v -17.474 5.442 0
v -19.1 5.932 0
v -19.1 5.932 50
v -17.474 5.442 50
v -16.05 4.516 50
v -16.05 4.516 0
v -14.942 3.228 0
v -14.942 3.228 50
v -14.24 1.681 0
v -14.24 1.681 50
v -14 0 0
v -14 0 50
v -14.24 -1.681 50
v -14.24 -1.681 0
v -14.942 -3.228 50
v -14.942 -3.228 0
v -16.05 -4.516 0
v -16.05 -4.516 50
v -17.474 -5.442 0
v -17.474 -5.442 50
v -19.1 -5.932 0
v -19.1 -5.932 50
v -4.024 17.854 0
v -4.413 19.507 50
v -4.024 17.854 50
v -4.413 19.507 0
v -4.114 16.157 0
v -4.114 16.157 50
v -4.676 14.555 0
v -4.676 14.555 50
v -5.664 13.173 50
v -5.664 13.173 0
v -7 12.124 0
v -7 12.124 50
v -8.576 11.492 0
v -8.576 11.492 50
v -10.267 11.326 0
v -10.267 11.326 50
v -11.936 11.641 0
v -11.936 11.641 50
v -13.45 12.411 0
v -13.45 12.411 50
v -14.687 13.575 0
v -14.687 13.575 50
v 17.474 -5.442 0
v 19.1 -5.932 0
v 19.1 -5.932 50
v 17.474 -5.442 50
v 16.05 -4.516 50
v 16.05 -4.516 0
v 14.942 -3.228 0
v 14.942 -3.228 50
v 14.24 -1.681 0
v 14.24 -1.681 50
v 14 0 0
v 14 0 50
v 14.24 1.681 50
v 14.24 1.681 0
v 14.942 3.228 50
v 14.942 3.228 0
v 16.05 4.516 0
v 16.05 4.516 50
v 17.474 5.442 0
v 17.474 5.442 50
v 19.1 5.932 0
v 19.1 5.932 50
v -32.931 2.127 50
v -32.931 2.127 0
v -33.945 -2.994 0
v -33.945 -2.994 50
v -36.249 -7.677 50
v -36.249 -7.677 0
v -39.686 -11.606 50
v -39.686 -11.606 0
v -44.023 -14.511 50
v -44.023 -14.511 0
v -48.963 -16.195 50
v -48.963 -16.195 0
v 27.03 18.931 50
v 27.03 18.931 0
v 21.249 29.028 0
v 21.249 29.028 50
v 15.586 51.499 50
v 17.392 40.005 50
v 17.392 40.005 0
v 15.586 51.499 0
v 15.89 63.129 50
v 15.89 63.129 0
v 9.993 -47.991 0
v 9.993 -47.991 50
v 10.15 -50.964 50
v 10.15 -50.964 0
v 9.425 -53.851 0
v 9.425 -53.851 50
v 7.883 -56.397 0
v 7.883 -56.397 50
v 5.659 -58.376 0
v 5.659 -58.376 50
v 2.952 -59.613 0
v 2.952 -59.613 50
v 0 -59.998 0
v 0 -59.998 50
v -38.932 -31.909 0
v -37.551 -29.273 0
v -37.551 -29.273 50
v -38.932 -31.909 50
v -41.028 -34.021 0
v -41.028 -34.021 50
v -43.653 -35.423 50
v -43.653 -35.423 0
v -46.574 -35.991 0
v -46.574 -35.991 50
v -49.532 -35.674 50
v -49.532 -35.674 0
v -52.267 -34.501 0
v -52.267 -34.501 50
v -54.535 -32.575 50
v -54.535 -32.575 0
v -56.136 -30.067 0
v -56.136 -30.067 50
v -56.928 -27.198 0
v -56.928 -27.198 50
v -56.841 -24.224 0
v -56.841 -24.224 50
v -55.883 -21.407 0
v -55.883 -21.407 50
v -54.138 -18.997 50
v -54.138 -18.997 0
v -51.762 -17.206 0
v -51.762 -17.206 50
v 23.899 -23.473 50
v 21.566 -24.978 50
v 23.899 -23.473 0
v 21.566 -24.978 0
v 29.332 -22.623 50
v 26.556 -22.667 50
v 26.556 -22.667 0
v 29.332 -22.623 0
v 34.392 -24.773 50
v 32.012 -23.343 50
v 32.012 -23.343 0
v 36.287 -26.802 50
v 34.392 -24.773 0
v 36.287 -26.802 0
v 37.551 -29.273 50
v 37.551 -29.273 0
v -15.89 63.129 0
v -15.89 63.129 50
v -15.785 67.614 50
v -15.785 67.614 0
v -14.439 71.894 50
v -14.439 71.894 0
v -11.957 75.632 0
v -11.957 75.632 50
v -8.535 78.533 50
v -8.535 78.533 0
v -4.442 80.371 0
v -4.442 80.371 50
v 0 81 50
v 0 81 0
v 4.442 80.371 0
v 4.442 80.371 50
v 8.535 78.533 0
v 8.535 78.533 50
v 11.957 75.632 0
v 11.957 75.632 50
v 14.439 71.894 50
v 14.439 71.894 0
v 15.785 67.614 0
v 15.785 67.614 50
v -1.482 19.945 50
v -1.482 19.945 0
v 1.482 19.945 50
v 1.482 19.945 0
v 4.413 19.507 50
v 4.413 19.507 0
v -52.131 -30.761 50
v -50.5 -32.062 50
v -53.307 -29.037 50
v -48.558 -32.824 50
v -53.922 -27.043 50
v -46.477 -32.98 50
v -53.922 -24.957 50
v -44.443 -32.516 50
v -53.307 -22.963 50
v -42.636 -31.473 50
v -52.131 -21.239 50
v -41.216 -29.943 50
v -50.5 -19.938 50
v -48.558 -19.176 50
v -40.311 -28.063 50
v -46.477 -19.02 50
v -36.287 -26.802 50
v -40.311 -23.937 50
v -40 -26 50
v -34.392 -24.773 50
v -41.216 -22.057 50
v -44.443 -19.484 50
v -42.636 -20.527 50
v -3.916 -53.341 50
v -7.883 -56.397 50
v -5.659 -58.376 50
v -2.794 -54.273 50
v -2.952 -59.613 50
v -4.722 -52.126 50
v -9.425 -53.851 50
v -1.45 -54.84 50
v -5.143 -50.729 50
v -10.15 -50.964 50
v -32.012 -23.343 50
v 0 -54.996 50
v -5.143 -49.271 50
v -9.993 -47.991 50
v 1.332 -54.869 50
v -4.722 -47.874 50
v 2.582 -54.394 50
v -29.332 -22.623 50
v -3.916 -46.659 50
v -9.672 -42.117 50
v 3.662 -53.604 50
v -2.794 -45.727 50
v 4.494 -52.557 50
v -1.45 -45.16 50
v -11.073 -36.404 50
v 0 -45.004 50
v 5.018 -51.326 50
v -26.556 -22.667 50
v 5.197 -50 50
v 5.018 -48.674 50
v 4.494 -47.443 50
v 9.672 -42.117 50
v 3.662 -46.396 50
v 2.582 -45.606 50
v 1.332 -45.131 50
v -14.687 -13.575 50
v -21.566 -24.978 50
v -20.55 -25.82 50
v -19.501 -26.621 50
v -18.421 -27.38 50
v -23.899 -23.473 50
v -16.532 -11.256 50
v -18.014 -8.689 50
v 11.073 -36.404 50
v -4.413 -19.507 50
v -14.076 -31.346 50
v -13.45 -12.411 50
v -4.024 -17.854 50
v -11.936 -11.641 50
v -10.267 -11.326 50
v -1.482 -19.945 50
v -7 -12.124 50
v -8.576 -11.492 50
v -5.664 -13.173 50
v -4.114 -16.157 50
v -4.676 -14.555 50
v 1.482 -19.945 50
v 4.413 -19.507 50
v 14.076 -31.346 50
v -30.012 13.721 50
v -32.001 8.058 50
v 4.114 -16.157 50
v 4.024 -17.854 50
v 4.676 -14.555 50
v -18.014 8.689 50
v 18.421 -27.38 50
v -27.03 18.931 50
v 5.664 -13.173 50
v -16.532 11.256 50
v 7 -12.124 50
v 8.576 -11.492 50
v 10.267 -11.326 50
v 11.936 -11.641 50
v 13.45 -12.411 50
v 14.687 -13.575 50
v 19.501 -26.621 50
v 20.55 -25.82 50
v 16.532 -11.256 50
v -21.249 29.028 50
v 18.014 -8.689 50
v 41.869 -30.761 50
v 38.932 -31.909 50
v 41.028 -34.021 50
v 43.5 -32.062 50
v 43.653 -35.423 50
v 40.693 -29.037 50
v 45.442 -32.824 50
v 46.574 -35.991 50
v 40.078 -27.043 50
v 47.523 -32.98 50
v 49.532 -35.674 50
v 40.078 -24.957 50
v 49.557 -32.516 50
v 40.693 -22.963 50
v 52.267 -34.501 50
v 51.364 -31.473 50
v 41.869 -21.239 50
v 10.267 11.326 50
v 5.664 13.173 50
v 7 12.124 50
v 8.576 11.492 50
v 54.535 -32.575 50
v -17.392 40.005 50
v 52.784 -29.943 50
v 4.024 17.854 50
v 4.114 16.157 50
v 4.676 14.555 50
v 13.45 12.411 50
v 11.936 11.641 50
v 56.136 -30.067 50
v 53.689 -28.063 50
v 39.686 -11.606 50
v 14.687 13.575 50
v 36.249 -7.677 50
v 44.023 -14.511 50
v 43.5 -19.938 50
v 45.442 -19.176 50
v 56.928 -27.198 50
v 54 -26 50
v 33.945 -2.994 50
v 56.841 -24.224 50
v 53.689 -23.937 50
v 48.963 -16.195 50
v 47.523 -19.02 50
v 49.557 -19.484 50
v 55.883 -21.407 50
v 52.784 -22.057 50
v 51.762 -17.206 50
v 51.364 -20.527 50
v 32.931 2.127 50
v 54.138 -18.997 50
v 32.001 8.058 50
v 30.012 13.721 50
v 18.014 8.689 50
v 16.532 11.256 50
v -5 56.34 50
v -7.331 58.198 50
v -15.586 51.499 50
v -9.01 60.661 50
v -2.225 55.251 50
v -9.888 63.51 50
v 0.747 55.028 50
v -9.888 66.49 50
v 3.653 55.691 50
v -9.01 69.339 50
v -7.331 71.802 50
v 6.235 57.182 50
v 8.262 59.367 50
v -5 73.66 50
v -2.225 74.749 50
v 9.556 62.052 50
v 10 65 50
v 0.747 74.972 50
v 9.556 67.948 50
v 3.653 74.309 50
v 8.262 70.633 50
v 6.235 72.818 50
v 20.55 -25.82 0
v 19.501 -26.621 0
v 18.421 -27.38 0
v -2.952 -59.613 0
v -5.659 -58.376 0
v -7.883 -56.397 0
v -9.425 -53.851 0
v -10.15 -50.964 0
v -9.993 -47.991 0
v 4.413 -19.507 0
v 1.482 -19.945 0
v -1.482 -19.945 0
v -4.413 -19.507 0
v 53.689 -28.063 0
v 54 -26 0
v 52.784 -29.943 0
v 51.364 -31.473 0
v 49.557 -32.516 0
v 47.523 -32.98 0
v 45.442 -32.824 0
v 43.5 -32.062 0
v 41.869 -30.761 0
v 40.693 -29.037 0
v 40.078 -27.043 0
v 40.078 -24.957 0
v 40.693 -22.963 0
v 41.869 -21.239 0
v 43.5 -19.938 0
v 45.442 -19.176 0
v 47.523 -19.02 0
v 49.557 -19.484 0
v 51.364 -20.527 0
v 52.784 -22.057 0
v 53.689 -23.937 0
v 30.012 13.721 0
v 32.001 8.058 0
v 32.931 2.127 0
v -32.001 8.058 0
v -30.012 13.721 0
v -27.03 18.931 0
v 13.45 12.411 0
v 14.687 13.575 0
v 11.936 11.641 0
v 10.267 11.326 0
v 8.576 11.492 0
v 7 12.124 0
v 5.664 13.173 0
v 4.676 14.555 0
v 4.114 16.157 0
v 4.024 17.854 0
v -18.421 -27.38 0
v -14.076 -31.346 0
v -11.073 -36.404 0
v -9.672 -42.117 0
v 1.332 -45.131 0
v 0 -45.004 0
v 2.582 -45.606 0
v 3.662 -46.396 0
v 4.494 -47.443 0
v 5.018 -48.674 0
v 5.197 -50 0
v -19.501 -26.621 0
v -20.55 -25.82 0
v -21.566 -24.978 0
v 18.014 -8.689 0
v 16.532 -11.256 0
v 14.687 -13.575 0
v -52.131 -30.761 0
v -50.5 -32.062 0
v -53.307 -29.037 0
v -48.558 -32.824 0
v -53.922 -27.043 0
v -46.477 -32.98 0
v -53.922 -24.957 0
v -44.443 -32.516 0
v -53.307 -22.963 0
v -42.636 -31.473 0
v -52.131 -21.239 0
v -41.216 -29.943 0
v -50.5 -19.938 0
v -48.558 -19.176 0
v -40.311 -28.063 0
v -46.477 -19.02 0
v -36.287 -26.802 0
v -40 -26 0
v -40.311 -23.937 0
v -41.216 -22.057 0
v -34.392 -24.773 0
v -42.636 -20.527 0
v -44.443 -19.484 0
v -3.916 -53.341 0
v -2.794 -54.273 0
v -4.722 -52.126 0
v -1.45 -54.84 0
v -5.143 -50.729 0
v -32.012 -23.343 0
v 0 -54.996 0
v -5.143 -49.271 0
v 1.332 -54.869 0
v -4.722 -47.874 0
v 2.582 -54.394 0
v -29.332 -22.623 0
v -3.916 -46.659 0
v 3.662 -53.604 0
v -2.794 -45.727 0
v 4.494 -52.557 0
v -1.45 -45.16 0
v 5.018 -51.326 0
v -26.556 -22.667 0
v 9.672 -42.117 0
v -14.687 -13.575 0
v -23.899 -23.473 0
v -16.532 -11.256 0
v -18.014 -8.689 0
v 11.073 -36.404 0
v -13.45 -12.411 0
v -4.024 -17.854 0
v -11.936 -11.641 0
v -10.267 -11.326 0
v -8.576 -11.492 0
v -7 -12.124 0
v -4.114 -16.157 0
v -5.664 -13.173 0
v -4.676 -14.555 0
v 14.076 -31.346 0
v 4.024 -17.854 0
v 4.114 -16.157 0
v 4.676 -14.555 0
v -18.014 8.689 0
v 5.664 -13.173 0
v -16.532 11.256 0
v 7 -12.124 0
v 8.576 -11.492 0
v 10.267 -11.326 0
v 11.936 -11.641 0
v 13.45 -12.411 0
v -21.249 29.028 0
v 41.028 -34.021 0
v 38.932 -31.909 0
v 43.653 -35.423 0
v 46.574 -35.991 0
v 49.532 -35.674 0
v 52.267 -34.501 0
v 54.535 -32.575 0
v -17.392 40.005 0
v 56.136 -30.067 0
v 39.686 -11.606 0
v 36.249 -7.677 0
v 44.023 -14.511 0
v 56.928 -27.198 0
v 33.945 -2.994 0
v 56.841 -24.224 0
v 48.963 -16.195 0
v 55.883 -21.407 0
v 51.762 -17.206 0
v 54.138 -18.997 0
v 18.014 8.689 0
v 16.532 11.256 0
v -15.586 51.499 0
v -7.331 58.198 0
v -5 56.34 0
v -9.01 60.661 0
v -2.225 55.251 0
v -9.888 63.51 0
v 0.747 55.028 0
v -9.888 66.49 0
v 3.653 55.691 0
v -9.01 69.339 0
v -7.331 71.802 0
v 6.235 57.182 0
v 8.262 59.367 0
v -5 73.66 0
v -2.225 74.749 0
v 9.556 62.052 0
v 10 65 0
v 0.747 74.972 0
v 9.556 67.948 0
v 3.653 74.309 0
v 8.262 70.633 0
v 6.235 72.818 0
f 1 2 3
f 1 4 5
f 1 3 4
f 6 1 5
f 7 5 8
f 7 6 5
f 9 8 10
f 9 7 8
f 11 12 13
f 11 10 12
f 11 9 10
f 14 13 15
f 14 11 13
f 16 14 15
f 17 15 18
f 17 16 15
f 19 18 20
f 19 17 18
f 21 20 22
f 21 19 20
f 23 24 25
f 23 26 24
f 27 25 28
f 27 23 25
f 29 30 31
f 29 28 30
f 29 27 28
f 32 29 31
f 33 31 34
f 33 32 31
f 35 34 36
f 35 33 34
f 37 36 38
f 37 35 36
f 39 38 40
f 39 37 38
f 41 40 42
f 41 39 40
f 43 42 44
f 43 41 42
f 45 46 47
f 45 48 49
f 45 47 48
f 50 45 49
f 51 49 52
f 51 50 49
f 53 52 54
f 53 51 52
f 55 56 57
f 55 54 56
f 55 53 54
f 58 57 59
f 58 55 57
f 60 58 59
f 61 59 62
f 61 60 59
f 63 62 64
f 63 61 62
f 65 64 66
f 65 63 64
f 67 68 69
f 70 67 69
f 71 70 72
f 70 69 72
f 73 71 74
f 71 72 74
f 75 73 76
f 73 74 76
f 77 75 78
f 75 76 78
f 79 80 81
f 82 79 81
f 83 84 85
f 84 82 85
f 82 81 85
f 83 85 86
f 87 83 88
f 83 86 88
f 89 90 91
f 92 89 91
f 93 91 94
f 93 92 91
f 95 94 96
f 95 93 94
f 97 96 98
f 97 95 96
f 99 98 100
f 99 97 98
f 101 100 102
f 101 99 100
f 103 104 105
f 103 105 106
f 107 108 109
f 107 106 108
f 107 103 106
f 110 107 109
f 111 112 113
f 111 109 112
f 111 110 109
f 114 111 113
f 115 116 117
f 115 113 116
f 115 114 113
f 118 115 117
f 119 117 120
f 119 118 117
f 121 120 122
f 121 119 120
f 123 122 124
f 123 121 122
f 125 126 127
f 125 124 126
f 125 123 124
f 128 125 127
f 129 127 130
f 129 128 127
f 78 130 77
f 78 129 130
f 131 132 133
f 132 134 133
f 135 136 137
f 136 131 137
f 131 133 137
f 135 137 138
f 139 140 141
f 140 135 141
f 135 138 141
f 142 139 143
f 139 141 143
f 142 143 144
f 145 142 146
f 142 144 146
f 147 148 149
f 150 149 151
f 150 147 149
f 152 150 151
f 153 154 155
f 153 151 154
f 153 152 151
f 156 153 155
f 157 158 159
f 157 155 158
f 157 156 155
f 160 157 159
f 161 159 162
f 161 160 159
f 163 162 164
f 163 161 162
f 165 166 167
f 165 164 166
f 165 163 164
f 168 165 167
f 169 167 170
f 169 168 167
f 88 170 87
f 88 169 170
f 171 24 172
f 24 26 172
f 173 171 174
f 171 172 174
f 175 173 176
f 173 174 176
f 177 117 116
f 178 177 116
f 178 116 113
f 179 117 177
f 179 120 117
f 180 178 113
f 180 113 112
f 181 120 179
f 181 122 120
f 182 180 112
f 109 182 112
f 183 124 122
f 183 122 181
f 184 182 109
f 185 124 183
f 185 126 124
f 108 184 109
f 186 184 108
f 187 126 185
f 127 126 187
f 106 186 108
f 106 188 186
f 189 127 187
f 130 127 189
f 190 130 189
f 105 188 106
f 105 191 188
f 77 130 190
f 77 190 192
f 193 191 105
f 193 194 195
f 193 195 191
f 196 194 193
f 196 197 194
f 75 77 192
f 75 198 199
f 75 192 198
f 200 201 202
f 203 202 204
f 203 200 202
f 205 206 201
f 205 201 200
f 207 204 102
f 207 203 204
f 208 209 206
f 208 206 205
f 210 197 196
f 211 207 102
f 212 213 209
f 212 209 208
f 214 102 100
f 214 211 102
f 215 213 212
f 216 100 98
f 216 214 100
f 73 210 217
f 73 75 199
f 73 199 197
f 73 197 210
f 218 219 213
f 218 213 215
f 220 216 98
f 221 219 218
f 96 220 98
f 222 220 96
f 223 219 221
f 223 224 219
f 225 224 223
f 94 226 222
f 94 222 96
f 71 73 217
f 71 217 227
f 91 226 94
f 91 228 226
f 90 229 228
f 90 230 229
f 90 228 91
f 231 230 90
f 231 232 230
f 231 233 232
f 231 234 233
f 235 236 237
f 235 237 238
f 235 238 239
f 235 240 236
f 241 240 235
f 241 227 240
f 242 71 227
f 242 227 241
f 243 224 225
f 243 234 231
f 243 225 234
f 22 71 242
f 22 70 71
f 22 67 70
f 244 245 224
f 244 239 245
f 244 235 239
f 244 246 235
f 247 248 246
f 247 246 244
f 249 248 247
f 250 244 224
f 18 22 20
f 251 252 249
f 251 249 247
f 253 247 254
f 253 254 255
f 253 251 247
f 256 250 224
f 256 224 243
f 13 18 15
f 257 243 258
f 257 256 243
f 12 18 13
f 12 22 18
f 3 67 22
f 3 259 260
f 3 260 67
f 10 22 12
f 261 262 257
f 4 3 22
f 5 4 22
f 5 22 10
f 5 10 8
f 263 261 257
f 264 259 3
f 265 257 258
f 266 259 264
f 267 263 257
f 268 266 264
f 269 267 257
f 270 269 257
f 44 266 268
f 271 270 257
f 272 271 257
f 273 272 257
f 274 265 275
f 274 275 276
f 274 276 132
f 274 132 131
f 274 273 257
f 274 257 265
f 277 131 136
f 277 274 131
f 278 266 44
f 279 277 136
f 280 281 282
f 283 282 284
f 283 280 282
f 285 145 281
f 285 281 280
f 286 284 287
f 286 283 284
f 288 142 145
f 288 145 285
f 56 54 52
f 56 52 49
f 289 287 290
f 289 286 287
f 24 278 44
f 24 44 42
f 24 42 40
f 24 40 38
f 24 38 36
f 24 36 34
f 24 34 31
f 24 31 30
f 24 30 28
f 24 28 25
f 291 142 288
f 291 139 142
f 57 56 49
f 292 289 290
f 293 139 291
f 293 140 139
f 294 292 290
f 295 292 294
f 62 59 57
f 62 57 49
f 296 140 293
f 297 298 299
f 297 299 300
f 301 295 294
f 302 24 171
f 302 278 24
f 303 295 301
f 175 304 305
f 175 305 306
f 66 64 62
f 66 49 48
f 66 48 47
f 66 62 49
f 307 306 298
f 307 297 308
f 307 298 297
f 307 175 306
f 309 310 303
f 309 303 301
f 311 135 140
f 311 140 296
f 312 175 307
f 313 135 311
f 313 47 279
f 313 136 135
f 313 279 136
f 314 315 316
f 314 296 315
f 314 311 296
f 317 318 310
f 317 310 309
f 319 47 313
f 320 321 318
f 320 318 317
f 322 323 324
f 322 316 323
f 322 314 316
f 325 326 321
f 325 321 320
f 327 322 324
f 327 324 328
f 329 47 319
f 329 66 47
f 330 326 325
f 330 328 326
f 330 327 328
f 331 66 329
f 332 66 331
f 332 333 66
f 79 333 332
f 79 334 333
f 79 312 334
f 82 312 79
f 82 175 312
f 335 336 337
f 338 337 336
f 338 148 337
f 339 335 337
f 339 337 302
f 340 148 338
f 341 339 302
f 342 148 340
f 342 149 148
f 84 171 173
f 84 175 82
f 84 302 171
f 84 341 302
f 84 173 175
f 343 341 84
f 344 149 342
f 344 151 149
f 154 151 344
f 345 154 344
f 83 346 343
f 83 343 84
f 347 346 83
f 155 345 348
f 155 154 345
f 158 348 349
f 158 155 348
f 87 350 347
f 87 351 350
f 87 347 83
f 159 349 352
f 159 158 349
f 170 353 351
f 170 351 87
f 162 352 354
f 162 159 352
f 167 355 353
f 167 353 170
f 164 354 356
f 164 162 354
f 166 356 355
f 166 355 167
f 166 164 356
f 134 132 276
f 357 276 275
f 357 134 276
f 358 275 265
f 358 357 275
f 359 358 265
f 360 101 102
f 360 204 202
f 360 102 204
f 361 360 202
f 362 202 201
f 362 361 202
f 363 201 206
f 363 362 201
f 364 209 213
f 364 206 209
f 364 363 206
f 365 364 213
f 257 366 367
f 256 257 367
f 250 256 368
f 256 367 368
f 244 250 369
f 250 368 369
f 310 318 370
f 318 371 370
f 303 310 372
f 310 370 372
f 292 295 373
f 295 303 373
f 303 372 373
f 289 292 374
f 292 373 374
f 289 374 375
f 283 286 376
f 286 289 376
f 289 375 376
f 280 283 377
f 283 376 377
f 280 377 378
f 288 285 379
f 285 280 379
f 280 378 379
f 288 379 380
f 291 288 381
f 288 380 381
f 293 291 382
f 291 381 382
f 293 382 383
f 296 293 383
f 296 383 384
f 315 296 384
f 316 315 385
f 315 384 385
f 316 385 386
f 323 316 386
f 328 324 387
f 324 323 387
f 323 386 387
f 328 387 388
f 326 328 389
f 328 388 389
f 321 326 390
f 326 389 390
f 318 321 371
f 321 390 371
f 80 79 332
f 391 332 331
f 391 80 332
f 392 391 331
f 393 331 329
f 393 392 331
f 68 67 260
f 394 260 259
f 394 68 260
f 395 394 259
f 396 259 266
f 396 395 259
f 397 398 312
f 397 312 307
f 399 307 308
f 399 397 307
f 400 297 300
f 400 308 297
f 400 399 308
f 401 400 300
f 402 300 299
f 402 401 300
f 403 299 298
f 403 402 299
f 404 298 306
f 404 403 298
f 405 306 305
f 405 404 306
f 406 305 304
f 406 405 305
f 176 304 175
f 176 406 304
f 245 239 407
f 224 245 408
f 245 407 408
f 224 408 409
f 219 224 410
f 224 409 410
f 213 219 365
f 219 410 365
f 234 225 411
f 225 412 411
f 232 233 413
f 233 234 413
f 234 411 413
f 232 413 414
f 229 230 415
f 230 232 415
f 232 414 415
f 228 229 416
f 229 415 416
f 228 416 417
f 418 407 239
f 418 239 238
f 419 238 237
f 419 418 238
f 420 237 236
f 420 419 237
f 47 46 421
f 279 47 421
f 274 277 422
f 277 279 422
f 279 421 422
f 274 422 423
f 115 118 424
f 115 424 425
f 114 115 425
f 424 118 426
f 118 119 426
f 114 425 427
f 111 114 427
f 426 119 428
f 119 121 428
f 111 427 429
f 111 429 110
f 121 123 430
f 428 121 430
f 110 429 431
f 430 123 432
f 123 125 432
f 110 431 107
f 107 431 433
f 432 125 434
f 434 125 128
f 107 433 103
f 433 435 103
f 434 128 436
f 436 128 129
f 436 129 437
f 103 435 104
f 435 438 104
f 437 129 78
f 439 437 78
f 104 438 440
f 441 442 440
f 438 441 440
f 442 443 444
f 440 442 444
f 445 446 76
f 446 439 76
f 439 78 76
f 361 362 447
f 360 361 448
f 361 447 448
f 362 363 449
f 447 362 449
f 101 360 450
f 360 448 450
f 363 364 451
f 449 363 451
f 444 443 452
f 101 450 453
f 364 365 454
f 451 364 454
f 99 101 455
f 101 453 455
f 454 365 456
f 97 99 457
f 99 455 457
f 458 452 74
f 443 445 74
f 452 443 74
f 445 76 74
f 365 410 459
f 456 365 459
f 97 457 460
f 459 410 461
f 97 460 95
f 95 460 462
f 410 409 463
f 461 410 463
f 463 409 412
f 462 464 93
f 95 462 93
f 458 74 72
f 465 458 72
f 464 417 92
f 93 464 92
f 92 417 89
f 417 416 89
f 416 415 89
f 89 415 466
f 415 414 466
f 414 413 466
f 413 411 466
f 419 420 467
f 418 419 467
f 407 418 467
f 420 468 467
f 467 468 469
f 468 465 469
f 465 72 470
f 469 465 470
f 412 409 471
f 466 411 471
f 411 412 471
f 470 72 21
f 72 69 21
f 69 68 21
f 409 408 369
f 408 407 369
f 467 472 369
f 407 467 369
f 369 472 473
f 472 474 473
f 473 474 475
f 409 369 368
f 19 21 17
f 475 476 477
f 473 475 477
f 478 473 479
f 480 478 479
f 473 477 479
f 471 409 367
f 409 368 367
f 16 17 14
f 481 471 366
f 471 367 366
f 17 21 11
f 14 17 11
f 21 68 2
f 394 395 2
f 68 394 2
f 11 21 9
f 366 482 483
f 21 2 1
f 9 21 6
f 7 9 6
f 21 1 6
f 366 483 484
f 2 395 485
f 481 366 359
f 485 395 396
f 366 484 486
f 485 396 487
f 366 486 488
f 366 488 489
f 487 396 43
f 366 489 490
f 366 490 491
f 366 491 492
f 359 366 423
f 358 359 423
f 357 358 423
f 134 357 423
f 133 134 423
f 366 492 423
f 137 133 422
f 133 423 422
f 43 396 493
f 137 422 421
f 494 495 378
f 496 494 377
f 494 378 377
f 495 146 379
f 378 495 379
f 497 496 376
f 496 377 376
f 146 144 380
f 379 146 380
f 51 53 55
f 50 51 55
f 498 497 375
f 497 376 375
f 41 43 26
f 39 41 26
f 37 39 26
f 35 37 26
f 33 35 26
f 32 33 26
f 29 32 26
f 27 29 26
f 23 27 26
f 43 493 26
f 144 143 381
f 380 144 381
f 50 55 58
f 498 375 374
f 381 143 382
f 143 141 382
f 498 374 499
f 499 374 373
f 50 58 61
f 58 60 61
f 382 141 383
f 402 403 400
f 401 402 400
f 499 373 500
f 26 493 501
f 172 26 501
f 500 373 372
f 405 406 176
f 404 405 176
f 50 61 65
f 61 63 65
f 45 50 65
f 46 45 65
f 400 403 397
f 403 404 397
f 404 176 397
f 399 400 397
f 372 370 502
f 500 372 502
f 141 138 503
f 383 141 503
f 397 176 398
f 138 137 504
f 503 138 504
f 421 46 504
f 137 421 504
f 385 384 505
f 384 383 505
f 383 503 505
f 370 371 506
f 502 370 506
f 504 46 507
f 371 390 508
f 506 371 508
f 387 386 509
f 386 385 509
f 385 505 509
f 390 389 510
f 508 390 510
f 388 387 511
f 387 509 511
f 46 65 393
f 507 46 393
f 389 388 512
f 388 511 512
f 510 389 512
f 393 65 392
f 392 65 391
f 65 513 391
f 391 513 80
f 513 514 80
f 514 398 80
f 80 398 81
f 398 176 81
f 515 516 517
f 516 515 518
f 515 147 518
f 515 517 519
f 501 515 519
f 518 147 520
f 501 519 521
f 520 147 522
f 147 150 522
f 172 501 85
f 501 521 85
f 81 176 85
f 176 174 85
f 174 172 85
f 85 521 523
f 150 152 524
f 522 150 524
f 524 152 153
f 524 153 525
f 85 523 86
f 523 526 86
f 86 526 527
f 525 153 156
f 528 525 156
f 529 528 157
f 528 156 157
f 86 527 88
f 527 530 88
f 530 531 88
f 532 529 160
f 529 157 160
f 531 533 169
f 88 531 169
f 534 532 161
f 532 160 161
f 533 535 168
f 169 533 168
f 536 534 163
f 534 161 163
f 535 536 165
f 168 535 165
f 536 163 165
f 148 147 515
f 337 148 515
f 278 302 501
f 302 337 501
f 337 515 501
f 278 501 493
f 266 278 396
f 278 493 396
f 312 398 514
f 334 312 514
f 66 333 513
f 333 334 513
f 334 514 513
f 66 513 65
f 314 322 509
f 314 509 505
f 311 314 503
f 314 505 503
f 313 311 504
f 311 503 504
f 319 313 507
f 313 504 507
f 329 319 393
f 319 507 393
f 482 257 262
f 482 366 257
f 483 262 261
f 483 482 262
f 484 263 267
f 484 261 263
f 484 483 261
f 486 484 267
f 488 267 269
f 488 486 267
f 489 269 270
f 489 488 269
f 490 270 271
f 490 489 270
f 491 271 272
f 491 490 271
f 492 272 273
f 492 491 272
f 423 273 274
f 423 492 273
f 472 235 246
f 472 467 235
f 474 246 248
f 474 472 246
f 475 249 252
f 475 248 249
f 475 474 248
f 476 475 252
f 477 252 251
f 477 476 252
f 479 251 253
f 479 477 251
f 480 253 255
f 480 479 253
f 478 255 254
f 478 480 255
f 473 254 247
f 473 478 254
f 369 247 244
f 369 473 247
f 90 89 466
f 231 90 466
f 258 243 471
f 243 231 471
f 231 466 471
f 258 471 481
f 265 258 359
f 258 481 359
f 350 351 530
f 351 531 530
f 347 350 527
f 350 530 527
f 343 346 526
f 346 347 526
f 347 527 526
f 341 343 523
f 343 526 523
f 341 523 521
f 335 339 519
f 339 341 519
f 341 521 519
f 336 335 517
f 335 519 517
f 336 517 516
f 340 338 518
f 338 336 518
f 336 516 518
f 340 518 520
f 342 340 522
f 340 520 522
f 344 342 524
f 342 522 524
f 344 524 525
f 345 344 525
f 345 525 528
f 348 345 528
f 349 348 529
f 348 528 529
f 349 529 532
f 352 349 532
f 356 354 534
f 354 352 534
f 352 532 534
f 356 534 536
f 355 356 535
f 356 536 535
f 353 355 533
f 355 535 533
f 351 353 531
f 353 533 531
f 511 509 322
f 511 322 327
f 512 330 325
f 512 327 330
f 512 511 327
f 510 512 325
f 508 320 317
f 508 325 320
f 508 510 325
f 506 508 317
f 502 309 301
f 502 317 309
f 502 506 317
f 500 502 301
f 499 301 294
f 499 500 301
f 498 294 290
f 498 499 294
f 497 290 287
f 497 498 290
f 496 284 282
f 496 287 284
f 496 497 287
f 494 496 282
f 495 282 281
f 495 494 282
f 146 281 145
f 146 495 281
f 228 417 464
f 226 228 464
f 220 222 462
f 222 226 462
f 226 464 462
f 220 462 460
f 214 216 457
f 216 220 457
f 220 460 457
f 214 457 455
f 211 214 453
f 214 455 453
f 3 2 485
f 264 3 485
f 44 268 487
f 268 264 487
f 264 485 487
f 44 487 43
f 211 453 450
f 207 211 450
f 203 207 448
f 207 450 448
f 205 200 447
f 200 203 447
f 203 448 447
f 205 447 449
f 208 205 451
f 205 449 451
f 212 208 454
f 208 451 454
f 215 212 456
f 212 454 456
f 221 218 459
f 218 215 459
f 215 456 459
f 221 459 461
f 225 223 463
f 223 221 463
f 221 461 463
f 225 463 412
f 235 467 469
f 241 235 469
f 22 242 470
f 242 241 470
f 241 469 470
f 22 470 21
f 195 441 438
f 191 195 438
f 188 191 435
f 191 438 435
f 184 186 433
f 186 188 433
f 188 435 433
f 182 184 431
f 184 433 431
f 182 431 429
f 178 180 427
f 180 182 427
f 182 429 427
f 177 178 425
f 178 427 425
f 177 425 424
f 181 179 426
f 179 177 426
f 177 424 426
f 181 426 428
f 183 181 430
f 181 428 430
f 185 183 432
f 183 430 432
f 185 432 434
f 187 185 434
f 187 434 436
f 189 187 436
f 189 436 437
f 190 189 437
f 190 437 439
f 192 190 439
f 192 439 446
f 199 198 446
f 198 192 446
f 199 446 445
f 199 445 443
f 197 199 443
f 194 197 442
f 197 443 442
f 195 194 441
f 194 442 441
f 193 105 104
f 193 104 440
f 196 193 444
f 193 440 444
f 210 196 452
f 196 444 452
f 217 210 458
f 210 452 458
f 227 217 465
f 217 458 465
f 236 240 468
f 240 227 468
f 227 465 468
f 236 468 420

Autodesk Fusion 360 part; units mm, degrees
sketch "Sketch1" plane through (0, 0, 0) normal (0, 0, 1) x (1, 0, 0)
  circle A0 centre (0, 65) radius 10
  circle A1 centre (-47, -26) radius 7
  arc A2 (-27.0298, 18.9312) -> (-15.8903, 63.1292) centre (-79.4513, 55.6462) ccw
  circle A3 centre (-0.1967, -50) radius 5
  arc A4 (-48.9633, -16.1946) -> (-32.9314, 2.127) centre (-52.8898, 3.4162) ccw
  arc A5 (-9.9929, -47.9913) -> (-18.421, -27.38) centre (-29.5853, -43.974) ccw
  arc A6 (-21.5665, -24.9777) -> (-37.5509, -29.2733) centre (-28.1018, -32.5467) ccw
  arc A7 (-19.1, -5.9321) -> (-19.1, 5.9321) centre (-20, 0) ccw
  arc A8 (-19.1, -5.9321) -> (-19.1, 5.9321) centre (-20, 0) ccw
  arc A9 (-19.1, -5.9321) -> (-19.1, 5.9321) centre (-20, 0) ccw
  arc A10 (-19.1, -5.9321) -> (-19.1, 5.9321) centre (-20, 0) ccw
  arc A11 (-4.4126, -19.5071) -> (-14.6874, -13.575) centre (-10, -17.3205) ccw
  arc A12 (14.6874, -13.575) -> (4.4126, -19.5071) centre (10, -17.3205) ccw
  arc A13 (-19.1, -5.9321) -> (-19.1, 5.9321) centre (-20, 0) ccw
  arc A14 (-19.1, -5.9321) -> (-14.6874, -13.575) centre (0, 0) ccw
  arc A15 (-14.6874, 13.575) -> (-4.4126, 19.5071) centre (-10, 17.3205) ccw
  arc A16 (-14.6874, 13.575) -> (-19.1, 5.9321) centre (0, 0) ccw
  arc A17 (4.4126, 19.5071) -> (14.6874, 13.575) centre (10, 17.3205) ccw
  arc A18 (4.4126, 19.5071) -> (-4.4126, 19.5071) centre (0, 0) ccw
  arc A19 (19.1, 5.9321) -> (19.1, -5.9321) centre (20, 0) ccw
  arc A20 (19.1, 5.9321) -> (14.6874, 13.575) centre (0, 0) ccw
  arc A21 (-4.4126, -19.5071) -> (4.4126, -19.5071) centre (0, 0) ccw
  arc A22 (14.6874, -13.575) -> (19.1, -5.9321) centre (0, 0) ccw
  arc A23 (-19.1, -5.9321) -> (-19.1, 5.9321) centre (-20, 0) ccw
  circle A24 centre (0, 65) radius 10
  arc A25 (15.8903, 63.1292) -> (27.0298, 18.9312) centre (79.4513, 55.6462) ccw
  arc A26 (32.9314, 2.127) -> (48.9633, -16.1946) centre (52.8898, 3.4162) ccw
  circle A27 centre (47, -26) radius 7
  arc A28 (37.5509, -29.2733) -> (21.5665, -24.9777) centre (28.1018, -32.5467) ccw
  arc A29 (18.421, -27.38) -> (9.9929, -47.9913) centre (29.5853, -43.974) ccw
  arc A30 (14.6874, -13.575) -> (19.1, -5.9321) centre (0, 0) ccw
  arc A31 (19.1, 5.9321) -> (19.1, -5.9321) centre (20, 0) ccw
  arc A32 (19.1, 5.9321) -> (14.6874, 13.575) centre (0, 0) ccw
  arc A33 (4.4126, 19.5071) -> (14.6874, 13.575) centre (10, 17.3205) ccw
  arc A34 (4.4126, 19.5071) -> (-4.4126, 19.5071) centre (0, 0) ccw
  arc A35 (-4.4126, -19.5071) -> (4.4126, -19.5071) centre (0, 0) ccw
  arc A36 (14.6874, -13.575) -> (4.4126, -19.5071) centre (10, -17.3205) ccw
  circle A37 centre (0.1967, -50) radius 5
  arc A38 (-4.4126, -19.5071) -> (-14.6874, -13.575) centre (-10, -17.3205) ccw
  arc A39 (-19.1, -5.9321) -> (-14.6874, -13.575) centre (0, 0) ccw
  arc A40 (-19.1, -5.9321) -> (-19.1, 5.9321) centre (-20, 0) ccw
  arc A41 (-14.6874, 13.575) -> (-4.4126, 19.5071) centre (-10, 17.3205) ccw
  arc A42 (-14.6874, 13.575) -> (-19.1, 5.9321) centre (0, 0) ccw
  arc A43 (-27.0298, 18.9312) -> (-32.9314, 2.127) centre (0, 0) ccw
  arc A44 (-27.0298, 18.9312) -> (-32.9314, 2.127) centre (0, 0) ccw
  arc A45 (-21.5665, -24.9777) -> (-18.421, -27.38) centre (0, 0) ccw
  arc A46 (-21.5665, -24.9777) -> (-18.421, -27.38) centre (0, 0) ccw
  arc A47 (18.421, -27.38) -> (21.5665, -24.9777) centre (0, 0) ccw
  arc A48 (32.9314, 2.127) -> (27.0298, 18.9312) centre (0, 0) ccw
  arc A49 (18.421, -27.38) -> (21.5665, -24.9777) centre (0, 0) ccw
  arc A50 (32.9314, 2.127) -> (27.0298, 18.9312) centre (0, 0) ccw
  arc A51 (-9.9929, -47.9913) -> (0, -59.9981) centre (-0.1967, -50) ccw
  arc A52 (0, -59.9981) -> (9.9929, -47.9913) centre (0.1967, -50) ccw
  arc A53 (-48.9633, -16.1946) -> (-37.5509, -29.2733) centre (-47, -26) ccw
  arc A54 (37.5509, -29.2733) -> (48.9633, -16.1946) centre (47, -26) ccw
  arc A55 (15.8903, 63.1292) -> (-15.8903, 63.1292) centre (0, 65) ccw
  arc A56 (15.8903, 63.1292) -> (-15.8903, 63.1292) centre (0, 65) ccw
  dimension "d1" = 20
  dimension "d2" = 65
  dimension "d3" = 32
  dimension "d4" = 40
  dimension "d5" = 66
  dimension "d6" = 128
  dimension "d7" = 14
  dimension "d8" = 47
  dimension "d9" = 26
  dimension "d10" = 20
  dimension "d11" = 40
  dimension "d12" = 10
  dimension "d13" = 50
  dimension "d14" = 20
  dimension "d15" = 40
  dimension "d16" = 20
  dimension "d17" = 12
  dimension "d21" = 360
sketch "Sketch2" plane through (0, 0, 0) normal (0, 0, 1) x (1, 0, 0)
sketch "Sketch3" plane through (0, 0, 0) normal (0, 0, 1) x (1, 0, 0)
extrude "Extrude1" add sketch "Sketch1" along normal blind 50
